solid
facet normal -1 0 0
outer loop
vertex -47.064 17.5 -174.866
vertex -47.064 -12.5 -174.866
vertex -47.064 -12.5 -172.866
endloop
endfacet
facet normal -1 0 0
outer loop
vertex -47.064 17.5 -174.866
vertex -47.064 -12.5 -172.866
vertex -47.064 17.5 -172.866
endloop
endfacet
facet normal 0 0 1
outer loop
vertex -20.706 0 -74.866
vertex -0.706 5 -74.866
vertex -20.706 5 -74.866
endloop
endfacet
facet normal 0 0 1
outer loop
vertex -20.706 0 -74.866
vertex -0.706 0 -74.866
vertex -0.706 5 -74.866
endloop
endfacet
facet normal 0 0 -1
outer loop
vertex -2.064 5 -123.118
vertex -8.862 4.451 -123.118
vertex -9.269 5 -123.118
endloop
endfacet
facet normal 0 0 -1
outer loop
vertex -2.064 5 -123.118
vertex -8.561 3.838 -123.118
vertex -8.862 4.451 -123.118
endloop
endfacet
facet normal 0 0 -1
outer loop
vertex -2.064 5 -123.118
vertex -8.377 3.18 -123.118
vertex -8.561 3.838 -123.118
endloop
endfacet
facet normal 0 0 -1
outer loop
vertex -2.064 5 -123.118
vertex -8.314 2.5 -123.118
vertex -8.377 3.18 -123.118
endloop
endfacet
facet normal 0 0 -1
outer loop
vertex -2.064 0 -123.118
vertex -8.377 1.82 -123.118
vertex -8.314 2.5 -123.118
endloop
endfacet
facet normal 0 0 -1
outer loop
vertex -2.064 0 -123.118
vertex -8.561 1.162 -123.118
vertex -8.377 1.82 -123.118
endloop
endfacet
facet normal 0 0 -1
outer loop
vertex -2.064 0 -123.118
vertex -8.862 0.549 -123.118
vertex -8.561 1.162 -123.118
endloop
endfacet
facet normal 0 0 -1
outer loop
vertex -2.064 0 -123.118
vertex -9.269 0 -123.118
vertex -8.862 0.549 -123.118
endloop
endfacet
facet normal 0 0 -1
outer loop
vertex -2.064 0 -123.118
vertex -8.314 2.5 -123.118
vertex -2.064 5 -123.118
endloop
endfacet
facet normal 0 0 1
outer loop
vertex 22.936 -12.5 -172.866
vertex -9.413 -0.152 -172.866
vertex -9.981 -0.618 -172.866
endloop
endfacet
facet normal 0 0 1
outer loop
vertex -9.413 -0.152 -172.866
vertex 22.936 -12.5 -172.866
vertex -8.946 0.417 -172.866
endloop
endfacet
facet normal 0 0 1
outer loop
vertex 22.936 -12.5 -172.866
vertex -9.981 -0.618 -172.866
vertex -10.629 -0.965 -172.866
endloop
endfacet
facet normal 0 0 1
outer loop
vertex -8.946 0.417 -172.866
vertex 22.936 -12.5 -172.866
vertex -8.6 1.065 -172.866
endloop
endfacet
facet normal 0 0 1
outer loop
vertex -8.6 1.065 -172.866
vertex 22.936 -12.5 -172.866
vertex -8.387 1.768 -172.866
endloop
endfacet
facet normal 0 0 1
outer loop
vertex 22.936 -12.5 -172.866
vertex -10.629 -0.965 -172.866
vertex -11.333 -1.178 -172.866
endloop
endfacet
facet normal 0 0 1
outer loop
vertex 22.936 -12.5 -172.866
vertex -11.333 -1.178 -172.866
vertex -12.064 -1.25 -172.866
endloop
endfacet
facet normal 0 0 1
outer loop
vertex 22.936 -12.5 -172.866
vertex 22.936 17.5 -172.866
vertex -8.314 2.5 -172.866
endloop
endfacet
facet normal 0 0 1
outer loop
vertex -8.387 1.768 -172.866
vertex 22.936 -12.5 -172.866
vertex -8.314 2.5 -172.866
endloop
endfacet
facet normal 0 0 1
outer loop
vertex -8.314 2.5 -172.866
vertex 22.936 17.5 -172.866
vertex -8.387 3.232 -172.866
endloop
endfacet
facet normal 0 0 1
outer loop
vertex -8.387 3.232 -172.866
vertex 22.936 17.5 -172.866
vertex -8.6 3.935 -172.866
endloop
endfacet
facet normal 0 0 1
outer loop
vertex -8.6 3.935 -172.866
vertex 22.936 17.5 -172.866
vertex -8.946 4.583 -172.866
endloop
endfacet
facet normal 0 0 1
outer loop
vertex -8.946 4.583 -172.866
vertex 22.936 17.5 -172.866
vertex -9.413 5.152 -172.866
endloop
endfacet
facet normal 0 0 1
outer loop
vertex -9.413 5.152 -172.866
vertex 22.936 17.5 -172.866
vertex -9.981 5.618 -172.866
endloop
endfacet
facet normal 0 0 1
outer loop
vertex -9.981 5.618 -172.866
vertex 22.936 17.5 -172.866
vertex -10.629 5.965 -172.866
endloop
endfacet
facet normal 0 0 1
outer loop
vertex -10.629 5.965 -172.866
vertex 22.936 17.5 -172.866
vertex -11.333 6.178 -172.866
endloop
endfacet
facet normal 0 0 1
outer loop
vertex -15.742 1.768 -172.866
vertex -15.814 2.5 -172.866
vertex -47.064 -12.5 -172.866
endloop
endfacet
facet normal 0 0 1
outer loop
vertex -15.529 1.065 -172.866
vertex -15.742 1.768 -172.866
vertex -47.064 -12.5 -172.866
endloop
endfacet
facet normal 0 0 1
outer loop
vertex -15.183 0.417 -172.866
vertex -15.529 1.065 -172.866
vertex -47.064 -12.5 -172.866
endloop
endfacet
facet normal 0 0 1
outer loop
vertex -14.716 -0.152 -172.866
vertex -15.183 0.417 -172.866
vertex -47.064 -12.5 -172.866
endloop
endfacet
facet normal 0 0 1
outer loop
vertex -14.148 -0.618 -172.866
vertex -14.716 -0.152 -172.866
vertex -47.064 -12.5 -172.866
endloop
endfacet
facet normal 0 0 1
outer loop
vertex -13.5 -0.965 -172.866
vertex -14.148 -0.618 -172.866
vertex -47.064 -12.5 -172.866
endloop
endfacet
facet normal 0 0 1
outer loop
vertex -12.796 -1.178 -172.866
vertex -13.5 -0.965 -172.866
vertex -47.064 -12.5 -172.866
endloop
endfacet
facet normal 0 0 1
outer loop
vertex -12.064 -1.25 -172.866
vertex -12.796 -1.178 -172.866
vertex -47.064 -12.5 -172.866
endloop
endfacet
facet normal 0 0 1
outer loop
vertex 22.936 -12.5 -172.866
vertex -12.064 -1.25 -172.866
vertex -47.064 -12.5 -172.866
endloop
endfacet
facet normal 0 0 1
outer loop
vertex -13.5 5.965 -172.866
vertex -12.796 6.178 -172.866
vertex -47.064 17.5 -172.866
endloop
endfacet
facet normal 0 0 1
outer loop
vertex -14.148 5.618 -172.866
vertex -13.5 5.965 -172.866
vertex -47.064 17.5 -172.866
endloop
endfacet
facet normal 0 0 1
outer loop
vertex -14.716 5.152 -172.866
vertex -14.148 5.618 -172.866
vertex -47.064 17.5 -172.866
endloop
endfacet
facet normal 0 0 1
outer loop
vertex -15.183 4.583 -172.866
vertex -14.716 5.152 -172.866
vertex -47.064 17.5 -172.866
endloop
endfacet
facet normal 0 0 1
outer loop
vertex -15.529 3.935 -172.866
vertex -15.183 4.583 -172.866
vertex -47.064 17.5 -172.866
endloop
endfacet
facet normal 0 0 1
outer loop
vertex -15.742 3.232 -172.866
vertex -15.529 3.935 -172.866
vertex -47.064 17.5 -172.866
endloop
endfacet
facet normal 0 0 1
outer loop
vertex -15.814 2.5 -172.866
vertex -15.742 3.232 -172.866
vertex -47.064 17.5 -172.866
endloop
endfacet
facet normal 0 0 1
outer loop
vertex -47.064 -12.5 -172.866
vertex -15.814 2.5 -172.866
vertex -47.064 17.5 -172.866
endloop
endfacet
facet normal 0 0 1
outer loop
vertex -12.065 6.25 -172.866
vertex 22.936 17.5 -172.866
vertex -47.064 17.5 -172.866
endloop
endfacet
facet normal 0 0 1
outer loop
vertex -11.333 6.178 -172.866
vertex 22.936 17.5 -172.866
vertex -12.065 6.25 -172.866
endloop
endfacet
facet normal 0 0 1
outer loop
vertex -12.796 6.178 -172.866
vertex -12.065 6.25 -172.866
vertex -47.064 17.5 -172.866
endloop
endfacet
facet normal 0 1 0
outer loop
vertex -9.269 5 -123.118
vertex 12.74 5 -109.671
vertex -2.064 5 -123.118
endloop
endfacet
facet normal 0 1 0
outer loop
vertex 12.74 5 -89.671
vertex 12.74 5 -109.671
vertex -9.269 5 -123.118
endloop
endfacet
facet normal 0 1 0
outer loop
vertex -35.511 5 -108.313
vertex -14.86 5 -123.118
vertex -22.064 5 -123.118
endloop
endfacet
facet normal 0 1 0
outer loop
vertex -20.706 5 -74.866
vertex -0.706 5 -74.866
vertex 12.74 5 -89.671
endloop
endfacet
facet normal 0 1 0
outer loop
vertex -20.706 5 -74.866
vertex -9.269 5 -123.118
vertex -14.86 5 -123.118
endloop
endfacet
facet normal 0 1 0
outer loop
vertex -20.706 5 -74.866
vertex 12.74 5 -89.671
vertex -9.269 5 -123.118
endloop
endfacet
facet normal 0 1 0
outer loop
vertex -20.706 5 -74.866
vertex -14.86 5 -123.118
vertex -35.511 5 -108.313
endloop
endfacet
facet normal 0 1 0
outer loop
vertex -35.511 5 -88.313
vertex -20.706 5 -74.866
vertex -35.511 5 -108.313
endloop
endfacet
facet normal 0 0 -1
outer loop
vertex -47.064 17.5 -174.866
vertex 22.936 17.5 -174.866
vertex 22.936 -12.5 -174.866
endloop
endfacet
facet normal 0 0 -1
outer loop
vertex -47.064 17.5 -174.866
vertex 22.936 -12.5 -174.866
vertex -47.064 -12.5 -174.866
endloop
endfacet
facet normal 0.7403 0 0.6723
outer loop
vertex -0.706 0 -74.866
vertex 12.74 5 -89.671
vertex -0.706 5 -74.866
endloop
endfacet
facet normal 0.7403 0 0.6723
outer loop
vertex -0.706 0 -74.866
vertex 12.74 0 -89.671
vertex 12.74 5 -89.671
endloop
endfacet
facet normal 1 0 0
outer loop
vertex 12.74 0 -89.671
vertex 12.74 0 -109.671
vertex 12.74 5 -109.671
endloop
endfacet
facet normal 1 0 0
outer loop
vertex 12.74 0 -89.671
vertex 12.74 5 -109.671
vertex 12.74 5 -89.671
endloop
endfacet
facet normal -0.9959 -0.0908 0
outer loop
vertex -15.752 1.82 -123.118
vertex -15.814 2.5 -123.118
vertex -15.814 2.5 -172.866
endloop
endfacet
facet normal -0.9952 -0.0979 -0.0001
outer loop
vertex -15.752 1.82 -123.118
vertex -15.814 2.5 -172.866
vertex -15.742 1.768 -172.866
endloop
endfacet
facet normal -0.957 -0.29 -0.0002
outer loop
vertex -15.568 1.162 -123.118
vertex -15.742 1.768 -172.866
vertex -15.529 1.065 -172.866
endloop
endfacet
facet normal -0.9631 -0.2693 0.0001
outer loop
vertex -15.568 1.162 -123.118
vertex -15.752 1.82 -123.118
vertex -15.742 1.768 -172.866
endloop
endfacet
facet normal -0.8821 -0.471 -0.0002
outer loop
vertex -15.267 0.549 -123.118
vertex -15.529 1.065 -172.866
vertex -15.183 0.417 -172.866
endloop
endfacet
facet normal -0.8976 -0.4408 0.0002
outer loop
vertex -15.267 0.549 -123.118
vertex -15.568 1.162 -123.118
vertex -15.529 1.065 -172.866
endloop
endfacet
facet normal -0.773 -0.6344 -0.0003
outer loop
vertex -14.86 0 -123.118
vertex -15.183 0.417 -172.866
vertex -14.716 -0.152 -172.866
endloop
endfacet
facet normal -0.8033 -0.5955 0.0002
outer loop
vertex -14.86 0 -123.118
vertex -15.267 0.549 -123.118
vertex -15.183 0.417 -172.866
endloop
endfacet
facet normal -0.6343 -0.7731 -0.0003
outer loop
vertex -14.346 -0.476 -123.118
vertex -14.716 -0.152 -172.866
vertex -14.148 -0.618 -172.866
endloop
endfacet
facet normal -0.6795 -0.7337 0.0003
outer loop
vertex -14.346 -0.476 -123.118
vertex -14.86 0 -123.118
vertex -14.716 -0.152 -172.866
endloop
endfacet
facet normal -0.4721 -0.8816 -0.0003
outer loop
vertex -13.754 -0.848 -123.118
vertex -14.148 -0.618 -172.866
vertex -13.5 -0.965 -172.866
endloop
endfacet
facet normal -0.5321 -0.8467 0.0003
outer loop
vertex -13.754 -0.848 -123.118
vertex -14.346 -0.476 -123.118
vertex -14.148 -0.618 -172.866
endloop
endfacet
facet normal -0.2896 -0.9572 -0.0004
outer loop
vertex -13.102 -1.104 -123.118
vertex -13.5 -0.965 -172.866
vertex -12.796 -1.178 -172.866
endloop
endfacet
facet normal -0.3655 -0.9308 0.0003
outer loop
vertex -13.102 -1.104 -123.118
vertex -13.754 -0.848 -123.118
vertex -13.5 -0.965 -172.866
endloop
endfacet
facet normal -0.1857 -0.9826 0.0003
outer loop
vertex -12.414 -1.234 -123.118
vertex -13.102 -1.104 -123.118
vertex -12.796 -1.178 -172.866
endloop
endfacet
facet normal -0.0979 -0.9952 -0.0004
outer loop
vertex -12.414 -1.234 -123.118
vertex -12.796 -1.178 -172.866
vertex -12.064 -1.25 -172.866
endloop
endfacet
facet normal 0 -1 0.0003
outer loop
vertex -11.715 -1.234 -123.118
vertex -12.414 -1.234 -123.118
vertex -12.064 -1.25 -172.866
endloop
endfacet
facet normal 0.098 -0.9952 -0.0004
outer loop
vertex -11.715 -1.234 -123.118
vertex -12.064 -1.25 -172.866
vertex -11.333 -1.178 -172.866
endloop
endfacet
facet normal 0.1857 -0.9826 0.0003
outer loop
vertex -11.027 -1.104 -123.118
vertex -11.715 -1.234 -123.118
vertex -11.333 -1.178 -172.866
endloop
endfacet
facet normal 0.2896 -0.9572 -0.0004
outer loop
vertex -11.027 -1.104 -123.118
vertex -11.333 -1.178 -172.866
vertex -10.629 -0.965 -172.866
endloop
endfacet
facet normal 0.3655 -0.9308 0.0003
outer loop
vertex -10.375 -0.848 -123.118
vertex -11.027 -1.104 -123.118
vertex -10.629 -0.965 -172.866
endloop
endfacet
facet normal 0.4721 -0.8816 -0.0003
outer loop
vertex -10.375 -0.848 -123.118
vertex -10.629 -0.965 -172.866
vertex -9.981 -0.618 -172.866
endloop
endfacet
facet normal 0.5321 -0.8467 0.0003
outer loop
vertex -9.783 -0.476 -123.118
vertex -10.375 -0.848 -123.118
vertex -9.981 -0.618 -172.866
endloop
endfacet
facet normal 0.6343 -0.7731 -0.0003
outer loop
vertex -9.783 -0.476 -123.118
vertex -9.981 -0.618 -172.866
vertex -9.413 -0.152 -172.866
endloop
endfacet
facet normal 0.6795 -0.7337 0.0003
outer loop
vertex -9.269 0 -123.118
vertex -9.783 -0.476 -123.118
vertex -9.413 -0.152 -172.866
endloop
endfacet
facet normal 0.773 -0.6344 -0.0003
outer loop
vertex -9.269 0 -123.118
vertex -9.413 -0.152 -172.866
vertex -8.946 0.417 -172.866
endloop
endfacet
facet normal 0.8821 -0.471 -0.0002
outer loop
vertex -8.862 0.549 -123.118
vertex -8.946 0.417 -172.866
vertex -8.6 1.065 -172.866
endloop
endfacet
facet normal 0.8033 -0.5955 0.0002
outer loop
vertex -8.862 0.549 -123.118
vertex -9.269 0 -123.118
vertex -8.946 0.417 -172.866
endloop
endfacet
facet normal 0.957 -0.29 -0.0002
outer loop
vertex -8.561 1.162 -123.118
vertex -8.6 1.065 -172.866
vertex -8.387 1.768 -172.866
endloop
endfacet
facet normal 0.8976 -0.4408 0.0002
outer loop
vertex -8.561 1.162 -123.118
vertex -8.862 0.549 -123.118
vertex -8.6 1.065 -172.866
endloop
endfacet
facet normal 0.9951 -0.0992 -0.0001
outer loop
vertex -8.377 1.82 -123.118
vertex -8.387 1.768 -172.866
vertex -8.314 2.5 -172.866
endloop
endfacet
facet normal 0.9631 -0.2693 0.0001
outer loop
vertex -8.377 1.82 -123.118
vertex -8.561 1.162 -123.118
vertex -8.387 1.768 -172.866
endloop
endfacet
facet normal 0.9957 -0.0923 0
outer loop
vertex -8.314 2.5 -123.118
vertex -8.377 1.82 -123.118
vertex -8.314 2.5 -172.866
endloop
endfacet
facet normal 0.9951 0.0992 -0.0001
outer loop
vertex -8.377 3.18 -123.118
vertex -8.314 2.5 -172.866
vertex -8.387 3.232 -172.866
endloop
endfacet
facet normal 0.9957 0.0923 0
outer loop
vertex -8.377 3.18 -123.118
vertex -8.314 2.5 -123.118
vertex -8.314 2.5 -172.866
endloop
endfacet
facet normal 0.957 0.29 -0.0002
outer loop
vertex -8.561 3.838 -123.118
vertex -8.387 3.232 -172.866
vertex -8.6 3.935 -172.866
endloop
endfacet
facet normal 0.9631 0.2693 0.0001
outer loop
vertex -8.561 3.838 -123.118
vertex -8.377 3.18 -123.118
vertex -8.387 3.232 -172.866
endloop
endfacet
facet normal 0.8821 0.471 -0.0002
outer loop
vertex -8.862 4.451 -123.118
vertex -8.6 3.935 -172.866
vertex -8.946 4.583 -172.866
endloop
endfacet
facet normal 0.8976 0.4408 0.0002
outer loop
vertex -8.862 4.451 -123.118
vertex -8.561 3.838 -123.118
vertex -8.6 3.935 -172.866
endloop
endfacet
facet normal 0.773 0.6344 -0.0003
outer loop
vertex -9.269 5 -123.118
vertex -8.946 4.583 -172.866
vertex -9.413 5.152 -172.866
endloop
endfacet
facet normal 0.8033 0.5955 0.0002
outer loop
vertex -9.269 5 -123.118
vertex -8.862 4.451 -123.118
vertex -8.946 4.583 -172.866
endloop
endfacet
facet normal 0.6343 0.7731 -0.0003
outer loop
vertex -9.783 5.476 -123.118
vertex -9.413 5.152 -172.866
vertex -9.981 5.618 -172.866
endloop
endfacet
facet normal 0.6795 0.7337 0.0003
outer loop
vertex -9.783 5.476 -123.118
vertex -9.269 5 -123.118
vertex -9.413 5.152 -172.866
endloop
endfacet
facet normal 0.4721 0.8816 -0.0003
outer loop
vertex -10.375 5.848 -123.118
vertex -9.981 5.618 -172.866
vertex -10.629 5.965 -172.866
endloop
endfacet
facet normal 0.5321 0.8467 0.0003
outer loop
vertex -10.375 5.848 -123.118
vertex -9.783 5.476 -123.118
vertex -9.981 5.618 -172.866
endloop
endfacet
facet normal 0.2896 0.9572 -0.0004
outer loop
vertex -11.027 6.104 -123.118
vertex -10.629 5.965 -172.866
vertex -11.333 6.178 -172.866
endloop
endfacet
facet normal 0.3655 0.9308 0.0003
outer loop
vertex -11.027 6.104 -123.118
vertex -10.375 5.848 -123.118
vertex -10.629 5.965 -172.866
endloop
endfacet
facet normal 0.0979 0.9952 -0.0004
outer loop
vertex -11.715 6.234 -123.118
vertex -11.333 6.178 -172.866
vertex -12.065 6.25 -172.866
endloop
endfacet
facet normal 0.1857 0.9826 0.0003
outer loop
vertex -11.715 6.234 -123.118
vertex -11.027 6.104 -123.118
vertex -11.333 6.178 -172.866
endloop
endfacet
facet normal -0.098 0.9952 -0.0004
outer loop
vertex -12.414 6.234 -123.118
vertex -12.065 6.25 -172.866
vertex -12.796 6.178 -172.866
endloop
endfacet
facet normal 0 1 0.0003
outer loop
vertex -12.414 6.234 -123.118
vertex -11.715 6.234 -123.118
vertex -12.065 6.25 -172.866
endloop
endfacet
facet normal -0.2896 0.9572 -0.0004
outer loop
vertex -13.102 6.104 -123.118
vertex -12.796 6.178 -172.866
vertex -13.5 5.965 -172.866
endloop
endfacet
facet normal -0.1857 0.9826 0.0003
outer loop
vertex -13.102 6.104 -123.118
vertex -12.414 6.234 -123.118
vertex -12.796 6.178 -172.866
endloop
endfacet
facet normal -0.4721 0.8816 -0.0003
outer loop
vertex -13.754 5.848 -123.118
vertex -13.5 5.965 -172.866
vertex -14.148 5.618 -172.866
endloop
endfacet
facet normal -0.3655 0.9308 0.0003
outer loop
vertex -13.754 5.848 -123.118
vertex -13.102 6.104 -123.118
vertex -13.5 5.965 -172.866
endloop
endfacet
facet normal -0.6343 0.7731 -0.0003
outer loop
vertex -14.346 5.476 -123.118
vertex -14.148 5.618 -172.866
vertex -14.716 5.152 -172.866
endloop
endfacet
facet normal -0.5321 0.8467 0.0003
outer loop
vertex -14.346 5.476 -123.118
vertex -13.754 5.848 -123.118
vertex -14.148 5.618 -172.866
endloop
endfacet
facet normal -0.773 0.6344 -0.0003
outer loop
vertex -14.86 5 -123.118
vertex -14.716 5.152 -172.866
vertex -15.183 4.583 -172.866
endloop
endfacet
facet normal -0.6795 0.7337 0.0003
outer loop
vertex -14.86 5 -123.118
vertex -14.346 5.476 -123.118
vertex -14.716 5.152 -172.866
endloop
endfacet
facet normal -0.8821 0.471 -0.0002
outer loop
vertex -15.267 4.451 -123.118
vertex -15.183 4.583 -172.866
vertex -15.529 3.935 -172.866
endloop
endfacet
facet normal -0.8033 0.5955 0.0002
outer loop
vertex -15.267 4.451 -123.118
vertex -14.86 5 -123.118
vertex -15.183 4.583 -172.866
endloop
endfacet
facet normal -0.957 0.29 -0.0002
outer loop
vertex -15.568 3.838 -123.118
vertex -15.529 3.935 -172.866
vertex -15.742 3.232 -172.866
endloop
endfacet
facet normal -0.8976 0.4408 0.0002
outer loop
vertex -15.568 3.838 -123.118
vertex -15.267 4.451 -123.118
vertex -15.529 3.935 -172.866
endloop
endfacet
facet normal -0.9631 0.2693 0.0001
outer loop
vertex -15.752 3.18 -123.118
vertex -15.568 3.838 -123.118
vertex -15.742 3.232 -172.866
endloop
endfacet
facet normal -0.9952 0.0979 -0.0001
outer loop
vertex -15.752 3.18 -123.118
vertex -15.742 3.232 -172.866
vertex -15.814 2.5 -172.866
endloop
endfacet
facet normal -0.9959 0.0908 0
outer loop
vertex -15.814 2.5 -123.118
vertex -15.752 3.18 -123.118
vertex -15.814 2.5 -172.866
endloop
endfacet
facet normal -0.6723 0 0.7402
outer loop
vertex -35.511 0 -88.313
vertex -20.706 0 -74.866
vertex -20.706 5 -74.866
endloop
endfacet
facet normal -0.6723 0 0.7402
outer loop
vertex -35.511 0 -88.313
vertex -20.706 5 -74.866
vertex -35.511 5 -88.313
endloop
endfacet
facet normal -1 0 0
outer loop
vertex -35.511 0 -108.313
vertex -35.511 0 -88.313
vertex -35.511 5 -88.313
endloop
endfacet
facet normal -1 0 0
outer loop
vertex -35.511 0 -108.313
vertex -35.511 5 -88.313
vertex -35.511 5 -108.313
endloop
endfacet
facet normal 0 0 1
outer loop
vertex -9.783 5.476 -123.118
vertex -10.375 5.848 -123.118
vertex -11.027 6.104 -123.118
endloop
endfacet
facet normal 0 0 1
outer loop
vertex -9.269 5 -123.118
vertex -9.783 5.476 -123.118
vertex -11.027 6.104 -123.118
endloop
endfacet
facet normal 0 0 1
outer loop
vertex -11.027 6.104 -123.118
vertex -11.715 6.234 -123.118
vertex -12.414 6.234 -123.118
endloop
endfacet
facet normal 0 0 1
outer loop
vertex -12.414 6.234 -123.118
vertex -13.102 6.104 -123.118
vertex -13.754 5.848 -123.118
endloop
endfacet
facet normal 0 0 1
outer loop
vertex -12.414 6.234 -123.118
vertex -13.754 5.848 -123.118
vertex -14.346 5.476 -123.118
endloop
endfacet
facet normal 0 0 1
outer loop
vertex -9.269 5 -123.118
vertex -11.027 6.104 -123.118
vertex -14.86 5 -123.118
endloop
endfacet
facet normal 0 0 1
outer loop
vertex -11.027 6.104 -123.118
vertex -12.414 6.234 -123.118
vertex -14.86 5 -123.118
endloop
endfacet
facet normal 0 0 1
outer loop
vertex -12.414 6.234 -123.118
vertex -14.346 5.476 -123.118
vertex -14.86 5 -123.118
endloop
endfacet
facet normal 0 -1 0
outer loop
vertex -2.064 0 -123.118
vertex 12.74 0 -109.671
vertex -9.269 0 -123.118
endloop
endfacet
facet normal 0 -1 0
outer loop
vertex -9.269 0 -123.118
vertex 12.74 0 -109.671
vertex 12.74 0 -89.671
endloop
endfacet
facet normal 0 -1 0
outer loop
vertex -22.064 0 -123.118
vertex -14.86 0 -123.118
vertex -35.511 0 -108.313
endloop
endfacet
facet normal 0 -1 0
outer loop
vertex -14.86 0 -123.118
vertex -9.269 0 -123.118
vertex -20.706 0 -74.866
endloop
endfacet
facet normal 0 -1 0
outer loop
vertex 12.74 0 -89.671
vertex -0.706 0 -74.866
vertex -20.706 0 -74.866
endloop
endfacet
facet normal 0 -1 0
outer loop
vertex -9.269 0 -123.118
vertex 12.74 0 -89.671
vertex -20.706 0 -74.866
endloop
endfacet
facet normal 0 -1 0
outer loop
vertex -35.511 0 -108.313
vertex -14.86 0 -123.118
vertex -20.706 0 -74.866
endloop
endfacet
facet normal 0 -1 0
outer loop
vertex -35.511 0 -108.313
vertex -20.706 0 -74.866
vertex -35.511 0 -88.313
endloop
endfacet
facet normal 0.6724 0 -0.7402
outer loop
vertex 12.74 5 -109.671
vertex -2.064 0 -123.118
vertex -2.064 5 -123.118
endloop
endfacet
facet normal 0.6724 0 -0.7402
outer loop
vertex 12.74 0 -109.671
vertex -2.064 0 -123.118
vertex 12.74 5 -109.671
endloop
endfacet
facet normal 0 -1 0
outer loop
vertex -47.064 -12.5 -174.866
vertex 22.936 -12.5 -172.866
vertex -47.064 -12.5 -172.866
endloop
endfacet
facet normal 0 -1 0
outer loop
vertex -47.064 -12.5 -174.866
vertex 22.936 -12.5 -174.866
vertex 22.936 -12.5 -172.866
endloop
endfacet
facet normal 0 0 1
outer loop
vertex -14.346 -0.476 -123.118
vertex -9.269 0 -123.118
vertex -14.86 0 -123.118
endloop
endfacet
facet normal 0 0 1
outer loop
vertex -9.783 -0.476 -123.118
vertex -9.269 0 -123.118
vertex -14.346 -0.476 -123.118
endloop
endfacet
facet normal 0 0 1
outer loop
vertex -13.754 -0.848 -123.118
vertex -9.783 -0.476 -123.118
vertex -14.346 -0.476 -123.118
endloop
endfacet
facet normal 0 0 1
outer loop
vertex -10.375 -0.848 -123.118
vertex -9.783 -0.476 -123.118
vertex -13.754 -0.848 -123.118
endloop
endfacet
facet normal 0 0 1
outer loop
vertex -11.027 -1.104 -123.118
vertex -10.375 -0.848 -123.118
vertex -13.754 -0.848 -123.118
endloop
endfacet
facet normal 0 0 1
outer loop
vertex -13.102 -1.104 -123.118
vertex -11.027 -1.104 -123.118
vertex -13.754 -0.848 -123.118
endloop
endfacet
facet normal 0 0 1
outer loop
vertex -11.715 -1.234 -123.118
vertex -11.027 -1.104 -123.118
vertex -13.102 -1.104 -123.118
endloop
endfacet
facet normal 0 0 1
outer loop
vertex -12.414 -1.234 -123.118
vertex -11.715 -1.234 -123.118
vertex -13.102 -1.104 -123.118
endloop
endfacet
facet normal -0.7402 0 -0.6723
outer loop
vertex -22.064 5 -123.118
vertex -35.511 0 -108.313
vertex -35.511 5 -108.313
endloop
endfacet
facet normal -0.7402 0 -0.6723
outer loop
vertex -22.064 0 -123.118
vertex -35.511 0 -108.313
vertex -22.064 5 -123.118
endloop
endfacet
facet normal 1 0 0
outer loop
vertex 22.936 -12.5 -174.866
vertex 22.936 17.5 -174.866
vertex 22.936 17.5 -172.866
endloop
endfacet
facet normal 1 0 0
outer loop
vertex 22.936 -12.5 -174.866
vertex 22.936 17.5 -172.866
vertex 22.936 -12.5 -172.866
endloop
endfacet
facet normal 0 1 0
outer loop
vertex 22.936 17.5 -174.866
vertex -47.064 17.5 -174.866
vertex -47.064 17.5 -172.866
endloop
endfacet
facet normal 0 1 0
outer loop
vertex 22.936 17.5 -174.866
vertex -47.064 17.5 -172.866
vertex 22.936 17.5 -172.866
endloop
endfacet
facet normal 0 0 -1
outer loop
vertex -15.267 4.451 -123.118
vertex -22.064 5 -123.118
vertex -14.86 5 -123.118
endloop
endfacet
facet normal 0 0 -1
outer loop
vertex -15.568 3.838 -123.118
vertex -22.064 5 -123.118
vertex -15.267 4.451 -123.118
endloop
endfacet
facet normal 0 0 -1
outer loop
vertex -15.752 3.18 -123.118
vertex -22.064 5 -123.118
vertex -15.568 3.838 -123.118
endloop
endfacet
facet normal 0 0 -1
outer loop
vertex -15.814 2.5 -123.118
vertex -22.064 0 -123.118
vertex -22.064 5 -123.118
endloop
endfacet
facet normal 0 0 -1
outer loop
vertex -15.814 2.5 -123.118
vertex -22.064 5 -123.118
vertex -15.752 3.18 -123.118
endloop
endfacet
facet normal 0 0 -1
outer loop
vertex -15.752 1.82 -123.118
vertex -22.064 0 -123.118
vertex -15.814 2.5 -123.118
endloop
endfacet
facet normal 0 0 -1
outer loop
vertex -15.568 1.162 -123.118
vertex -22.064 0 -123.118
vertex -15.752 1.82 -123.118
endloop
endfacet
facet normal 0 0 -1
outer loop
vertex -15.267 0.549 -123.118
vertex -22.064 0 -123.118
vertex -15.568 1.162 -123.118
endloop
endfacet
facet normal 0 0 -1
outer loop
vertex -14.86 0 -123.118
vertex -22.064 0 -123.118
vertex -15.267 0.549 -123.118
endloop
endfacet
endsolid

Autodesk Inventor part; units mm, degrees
ref_plane "YZ Plane" through (0, 0, 0) normal (1, 0, 0) x (0, 1, 0)
ref_plane "XZ Plane" through (0, 0, 0) normal (0, 1, 0) x (-1, 0, 0)
ref_plane "XY Plane" through (0, 0, 0) normal (0, 0, 1) x (1, 0, 0)
sketch "Skizze1" plane through (0, 0, 0) normal (0, 1, 0) x (-1, 0, 0)
  line L0 (35.5112, -88.3128) -> (35.5112, -108.3128)
  line L1 (35.5112, -108.3128) -> (22.0645, -123.1178)
  line L2 (22.0645, -123.1178) -> (2.0645, -123.1178)
  line L3 (2.0645, -123.1178) -> (-12.7404, -109.6711)
  line L4 (-12.7404, -109.6711) -> (-12.7404, -89.6711)
  line L5 (-12.7404, -89.6711) -> (0.7063, -74.8661)
  line L6 (0.7063, -74.8661) -> (20.7063, -74.8661)
  line L7 (20.7063, -74.8661) -> (35.5112, -88.3128)
  point P0 (0, 0)
  dimension "d0" = 20
  dimension "d1" = 20
  dimension "d2" = 20
  dimension "d3" = 20
  dimension "d4" = 20
  dimension "d5" = 20
  dimension "d6" = 20
  dimension "d7" = 20
extrude "Extrusion1" add sketch "Skizze1" along normal blind 5
sketch "Skizze2" plane through (-2.0645, 0, -123.1178) normal (0, 0, -1) x (-1, 0, 0)
  circle A0 centre (10, 2.5) radius 3.75
  line L0 (0, 5) -> (20, 5) projected
  point P0 (-2.0645, 0)
  dimension "d11" = 7.5
  dimension "d12" = 2.5
extrude "Extrusion2" add sketch "Skizze2" along normal blind 51.748
sketch "Skizze3" plane through (-12.0645, 2.5, -174.8658) normal (0, 0, -1) x (-1, 0, 0)
  line L0 (-35, -15) -> (35, -15)
  line L1 (35, -15) -> (35, 15)
  line L2 (35, 15) -> (-35, 15)
  line L3 (-35, 15) -> (-35, -15)
  arc A0 (-2.7951, 2.5) -> (-2.7951, -2.5) centre (0, 0) ccw projected
  line L4 (-35, -15) -> (35, 15) construction
  line L5 (35, -15) -> (-35, 15) construction
  point P0 (-12.0645, -2.5)
  dimension "d15" = 70
  dimension "d16" = 30
extrude "Extrusion3" add sketch "Skizze3" against normal blind 2
sketch "Skizze4" plane through (0, 5, 0) normal (0, 1, 0) x (1, 0, 0)
  point P0 (0, 0)
properties part number "Stoppschild_klein 10 cm Höhe"
